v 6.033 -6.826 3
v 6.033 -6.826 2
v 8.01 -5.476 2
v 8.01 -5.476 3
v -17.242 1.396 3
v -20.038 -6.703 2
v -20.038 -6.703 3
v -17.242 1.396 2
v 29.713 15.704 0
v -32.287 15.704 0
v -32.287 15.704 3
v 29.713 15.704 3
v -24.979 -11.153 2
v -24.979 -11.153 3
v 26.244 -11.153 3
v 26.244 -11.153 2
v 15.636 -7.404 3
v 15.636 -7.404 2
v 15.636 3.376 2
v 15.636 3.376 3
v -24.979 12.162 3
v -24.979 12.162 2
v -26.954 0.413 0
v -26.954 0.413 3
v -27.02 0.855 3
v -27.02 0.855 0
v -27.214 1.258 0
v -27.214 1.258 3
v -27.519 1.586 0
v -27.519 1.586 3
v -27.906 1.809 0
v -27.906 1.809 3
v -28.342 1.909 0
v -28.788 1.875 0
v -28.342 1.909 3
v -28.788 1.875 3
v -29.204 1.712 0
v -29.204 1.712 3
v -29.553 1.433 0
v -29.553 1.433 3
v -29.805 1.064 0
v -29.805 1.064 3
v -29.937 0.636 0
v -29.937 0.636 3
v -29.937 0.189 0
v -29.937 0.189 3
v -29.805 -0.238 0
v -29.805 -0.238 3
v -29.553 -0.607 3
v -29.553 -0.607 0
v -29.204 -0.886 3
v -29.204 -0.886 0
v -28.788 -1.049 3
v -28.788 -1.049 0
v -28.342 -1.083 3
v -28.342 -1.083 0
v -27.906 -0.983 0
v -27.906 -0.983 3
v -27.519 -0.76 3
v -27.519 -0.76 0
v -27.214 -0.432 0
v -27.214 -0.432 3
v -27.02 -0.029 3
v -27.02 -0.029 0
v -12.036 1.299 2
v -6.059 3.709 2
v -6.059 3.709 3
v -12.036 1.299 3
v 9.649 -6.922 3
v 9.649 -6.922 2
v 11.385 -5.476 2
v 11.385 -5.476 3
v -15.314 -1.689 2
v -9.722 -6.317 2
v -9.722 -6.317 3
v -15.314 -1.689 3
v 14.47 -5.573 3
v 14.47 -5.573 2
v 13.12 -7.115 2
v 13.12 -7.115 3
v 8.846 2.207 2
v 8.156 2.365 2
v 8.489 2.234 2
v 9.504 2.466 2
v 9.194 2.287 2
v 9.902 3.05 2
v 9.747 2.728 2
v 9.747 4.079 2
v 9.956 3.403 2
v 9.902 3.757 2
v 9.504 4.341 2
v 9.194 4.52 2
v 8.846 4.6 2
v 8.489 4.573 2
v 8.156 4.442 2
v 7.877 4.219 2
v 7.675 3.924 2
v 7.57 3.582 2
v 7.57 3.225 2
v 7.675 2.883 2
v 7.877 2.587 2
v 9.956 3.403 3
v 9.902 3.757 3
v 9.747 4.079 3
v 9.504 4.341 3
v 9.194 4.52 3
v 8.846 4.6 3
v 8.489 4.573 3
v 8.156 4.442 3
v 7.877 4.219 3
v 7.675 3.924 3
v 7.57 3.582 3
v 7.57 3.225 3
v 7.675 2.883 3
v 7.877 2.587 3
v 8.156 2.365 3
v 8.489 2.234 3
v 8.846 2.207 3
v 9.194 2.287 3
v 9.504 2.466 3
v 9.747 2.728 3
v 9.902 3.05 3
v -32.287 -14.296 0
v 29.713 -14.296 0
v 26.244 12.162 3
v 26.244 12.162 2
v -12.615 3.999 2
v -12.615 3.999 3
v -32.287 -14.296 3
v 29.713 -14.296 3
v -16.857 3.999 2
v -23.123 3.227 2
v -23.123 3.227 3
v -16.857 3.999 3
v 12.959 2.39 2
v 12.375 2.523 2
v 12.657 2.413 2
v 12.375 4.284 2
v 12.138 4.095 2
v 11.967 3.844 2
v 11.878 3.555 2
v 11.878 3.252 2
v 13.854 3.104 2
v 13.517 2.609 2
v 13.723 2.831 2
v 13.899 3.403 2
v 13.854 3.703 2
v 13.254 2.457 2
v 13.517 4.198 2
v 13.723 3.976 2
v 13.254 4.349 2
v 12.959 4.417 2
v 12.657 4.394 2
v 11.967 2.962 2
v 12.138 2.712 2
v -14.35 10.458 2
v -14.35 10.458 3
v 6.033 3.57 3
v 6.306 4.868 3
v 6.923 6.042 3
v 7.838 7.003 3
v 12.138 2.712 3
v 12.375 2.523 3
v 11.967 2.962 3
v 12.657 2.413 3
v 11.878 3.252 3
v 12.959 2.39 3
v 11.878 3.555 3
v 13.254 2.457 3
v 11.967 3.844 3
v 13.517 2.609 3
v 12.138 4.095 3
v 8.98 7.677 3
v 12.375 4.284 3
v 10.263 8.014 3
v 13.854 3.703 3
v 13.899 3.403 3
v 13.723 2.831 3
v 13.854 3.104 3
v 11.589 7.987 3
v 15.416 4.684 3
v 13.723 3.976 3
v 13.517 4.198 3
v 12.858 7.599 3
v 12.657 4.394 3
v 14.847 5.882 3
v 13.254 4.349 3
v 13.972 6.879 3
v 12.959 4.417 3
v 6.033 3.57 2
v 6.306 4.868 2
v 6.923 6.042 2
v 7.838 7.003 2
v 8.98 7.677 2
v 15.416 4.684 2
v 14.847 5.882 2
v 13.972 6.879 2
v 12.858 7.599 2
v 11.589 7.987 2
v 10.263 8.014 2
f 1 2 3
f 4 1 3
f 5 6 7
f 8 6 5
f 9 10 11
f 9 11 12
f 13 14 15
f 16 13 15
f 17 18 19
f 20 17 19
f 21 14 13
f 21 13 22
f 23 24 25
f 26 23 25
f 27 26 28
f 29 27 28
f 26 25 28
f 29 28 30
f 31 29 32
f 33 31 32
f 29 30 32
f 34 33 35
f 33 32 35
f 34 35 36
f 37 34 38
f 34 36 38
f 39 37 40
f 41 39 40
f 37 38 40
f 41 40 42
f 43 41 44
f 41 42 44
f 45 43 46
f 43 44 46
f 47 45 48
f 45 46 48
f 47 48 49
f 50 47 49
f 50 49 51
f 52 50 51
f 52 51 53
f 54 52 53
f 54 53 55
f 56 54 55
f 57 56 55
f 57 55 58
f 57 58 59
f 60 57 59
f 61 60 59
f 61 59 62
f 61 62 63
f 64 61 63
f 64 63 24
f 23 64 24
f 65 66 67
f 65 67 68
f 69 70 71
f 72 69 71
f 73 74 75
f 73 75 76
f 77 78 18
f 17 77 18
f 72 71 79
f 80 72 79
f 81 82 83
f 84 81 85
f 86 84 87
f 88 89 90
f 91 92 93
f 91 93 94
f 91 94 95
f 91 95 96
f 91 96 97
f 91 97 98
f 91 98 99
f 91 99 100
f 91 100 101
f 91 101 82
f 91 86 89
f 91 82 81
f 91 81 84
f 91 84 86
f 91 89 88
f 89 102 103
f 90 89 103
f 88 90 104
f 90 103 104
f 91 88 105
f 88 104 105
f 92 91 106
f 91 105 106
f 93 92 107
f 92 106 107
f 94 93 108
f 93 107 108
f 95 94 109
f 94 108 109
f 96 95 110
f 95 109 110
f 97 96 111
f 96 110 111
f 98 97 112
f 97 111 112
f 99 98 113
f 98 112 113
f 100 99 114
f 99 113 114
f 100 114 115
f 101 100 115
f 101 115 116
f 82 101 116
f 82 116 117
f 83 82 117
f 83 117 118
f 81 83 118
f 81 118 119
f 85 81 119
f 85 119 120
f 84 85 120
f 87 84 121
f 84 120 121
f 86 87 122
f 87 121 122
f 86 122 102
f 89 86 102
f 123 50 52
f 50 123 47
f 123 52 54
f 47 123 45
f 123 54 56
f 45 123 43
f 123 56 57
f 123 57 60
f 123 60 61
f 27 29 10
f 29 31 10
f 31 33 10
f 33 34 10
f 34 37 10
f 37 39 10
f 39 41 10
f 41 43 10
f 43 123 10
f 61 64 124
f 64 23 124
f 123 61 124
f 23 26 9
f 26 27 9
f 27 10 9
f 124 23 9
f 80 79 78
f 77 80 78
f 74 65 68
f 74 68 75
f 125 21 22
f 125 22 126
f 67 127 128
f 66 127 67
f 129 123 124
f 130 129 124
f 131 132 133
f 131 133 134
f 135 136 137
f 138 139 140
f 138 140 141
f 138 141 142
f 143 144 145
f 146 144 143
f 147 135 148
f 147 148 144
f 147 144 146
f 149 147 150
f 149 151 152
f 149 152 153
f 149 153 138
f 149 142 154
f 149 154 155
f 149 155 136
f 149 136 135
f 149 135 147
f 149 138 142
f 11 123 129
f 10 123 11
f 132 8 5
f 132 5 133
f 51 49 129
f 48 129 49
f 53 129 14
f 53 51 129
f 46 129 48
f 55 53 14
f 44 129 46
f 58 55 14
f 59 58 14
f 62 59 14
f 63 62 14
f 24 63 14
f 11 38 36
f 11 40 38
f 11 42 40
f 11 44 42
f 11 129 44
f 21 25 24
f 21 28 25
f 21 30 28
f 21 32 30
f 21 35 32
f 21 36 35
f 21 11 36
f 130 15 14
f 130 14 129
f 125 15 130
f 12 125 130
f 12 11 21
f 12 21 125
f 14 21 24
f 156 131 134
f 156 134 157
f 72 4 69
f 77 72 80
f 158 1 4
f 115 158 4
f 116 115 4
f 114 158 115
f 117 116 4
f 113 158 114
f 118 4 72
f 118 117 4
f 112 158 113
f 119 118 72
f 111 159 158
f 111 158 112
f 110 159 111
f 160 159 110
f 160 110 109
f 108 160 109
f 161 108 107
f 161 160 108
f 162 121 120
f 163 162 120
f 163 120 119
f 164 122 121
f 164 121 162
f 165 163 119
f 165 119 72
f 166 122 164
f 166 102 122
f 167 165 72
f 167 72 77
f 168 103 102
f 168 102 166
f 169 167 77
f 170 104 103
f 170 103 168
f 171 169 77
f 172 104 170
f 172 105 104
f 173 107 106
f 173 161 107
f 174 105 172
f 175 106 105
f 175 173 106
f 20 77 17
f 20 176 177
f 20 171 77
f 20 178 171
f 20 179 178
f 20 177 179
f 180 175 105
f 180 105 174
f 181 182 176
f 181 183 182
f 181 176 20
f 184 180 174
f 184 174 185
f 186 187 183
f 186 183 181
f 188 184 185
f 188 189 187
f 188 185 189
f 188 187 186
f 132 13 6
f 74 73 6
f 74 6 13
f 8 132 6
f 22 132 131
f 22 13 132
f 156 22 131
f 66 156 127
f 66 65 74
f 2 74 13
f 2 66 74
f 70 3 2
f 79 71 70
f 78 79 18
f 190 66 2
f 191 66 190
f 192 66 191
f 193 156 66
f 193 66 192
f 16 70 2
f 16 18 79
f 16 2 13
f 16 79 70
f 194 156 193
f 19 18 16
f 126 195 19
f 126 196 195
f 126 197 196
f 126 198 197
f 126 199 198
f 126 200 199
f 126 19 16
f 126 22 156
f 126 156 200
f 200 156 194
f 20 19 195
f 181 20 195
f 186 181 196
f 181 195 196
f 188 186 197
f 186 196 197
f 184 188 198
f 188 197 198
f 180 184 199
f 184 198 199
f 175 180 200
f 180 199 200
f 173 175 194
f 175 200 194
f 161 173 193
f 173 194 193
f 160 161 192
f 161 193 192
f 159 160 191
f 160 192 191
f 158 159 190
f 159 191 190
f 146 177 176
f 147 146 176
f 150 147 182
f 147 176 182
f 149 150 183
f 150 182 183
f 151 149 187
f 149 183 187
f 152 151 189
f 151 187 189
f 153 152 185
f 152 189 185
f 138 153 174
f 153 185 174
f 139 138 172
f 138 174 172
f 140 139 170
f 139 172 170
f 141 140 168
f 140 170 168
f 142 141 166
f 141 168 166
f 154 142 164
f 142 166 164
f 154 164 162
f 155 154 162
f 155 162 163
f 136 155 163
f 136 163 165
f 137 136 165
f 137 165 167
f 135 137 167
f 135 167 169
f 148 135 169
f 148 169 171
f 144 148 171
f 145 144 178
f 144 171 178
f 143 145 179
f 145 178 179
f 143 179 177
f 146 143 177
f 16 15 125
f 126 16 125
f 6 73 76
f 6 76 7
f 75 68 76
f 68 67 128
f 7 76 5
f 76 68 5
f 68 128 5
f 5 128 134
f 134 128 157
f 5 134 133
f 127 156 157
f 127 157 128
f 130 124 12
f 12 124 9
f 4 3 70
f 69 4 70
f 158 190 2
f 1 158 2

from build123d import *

# Parameters (mm, degrees)
SKETCH_W        = 62
SKETCH_H        = 30
PAD_DEPTH       = 3
SKETCH001_W     = 51.222641
SKETCH001_H     = 23.315135
POCKET_DEPTH    = 1
SKETCH002_R     = 1.5
POCKET001_DEPTH = 3.001
PAD001_DEPTH    = 1
PAD002_DEPTH    = 1
SKETCH005_R     = 1.199553
SKETCH005_R_2   = 1.016367
POCKET002_DEPTH = 1


with BuildPart() as part:
    # Sketch → Pad (new body)
    with BuildSketch(Plane.XY):
        with Locations((-1.286613, 0.704456)):
            Rectangle(SKETCH_W, SKETCH_H)
    extrude(amount=PAD_DEPTH)

    # Sketch001 → Pocket (cut)
    with BuildSketch(Plane.XY.offset(3)):
        with Locations((0.632324, 0.504924)):
            Rectangle(SKETCH001_W, SKETCH001_H)
    extrude(amount=-POCKET_DEPTH, mode=Mode.SUBTRACT)

    # Sketch002 → Pocket001 (cut, through all)
    with BuildSketch(Plane.XY.offset(3)):
        with Locations((-28.453762, 0.41293)):
            Circle(SKETCH002_R)
    extrude(amount=-POCKET001_DEPTH, mode=Mode.SUBTRACT)

    # Sketch003 → Pad001 (new body)
    with BuildSketch(Plane.XY.offset(2)):
        Polygon((-16.856503, 3.99872), (-14.349889, 10.458068), (-12.61454, 3.99872), (-6.058784, 3.709493), (-12.036091, 1.299289), (-9.722297, -6.316956), (-15.313969, -1.689364), (-20.03797, -6.70259), (-17.242132, 1.395697), (-23.123034, 3.227453), align=None)
    extrude(amount=PAD001_DEPTH)

    # Sketch004 → Pad002 (new body)
    with BuildSketch(Plane.XY.offset(2)):
        with BuildLine():
            Line((6.033253, 3.5701), (6.033253, -6.826028))
            Line((6.033253, -6.826028), (8.010232, -5.476315))
            Line((8.010232, -5.476315), (9.649171, -6.922436))
            Line((9.649171, -6.922436), (11.384521, -5.476315))
            Line((11.384521, -5.476315), (13.119864, -7.115253))
            Line((13.119864, -7.115253), (14.469583, -5.572722))
            Line((14.469583, -5.572722), (15.636065, -7.404478))
            Line((15.636065, -7.404478), (15.636065, 3.375676))
            ThreePointArc((15.636065, 3.375676), (10.927253, 8.046213), (6.033253, 3.5701))
        make_face()
    extrude(amount=PAD002_DEPTH)

    # Sketch005 → Pocket002 (cut)
    with BuildSketch(Plane.XY.offset(3)):
        with Locations((8.755972, 3.403389)):
            Circle(SKETCH005_R)
        with Locations((12.882946, 3.403389)):
            Circle(SKETCH005_R_2)
    extrude(amount=-POCKET002_DEPTH, mode=Mode.SUBTRACT)


solid = part.part
